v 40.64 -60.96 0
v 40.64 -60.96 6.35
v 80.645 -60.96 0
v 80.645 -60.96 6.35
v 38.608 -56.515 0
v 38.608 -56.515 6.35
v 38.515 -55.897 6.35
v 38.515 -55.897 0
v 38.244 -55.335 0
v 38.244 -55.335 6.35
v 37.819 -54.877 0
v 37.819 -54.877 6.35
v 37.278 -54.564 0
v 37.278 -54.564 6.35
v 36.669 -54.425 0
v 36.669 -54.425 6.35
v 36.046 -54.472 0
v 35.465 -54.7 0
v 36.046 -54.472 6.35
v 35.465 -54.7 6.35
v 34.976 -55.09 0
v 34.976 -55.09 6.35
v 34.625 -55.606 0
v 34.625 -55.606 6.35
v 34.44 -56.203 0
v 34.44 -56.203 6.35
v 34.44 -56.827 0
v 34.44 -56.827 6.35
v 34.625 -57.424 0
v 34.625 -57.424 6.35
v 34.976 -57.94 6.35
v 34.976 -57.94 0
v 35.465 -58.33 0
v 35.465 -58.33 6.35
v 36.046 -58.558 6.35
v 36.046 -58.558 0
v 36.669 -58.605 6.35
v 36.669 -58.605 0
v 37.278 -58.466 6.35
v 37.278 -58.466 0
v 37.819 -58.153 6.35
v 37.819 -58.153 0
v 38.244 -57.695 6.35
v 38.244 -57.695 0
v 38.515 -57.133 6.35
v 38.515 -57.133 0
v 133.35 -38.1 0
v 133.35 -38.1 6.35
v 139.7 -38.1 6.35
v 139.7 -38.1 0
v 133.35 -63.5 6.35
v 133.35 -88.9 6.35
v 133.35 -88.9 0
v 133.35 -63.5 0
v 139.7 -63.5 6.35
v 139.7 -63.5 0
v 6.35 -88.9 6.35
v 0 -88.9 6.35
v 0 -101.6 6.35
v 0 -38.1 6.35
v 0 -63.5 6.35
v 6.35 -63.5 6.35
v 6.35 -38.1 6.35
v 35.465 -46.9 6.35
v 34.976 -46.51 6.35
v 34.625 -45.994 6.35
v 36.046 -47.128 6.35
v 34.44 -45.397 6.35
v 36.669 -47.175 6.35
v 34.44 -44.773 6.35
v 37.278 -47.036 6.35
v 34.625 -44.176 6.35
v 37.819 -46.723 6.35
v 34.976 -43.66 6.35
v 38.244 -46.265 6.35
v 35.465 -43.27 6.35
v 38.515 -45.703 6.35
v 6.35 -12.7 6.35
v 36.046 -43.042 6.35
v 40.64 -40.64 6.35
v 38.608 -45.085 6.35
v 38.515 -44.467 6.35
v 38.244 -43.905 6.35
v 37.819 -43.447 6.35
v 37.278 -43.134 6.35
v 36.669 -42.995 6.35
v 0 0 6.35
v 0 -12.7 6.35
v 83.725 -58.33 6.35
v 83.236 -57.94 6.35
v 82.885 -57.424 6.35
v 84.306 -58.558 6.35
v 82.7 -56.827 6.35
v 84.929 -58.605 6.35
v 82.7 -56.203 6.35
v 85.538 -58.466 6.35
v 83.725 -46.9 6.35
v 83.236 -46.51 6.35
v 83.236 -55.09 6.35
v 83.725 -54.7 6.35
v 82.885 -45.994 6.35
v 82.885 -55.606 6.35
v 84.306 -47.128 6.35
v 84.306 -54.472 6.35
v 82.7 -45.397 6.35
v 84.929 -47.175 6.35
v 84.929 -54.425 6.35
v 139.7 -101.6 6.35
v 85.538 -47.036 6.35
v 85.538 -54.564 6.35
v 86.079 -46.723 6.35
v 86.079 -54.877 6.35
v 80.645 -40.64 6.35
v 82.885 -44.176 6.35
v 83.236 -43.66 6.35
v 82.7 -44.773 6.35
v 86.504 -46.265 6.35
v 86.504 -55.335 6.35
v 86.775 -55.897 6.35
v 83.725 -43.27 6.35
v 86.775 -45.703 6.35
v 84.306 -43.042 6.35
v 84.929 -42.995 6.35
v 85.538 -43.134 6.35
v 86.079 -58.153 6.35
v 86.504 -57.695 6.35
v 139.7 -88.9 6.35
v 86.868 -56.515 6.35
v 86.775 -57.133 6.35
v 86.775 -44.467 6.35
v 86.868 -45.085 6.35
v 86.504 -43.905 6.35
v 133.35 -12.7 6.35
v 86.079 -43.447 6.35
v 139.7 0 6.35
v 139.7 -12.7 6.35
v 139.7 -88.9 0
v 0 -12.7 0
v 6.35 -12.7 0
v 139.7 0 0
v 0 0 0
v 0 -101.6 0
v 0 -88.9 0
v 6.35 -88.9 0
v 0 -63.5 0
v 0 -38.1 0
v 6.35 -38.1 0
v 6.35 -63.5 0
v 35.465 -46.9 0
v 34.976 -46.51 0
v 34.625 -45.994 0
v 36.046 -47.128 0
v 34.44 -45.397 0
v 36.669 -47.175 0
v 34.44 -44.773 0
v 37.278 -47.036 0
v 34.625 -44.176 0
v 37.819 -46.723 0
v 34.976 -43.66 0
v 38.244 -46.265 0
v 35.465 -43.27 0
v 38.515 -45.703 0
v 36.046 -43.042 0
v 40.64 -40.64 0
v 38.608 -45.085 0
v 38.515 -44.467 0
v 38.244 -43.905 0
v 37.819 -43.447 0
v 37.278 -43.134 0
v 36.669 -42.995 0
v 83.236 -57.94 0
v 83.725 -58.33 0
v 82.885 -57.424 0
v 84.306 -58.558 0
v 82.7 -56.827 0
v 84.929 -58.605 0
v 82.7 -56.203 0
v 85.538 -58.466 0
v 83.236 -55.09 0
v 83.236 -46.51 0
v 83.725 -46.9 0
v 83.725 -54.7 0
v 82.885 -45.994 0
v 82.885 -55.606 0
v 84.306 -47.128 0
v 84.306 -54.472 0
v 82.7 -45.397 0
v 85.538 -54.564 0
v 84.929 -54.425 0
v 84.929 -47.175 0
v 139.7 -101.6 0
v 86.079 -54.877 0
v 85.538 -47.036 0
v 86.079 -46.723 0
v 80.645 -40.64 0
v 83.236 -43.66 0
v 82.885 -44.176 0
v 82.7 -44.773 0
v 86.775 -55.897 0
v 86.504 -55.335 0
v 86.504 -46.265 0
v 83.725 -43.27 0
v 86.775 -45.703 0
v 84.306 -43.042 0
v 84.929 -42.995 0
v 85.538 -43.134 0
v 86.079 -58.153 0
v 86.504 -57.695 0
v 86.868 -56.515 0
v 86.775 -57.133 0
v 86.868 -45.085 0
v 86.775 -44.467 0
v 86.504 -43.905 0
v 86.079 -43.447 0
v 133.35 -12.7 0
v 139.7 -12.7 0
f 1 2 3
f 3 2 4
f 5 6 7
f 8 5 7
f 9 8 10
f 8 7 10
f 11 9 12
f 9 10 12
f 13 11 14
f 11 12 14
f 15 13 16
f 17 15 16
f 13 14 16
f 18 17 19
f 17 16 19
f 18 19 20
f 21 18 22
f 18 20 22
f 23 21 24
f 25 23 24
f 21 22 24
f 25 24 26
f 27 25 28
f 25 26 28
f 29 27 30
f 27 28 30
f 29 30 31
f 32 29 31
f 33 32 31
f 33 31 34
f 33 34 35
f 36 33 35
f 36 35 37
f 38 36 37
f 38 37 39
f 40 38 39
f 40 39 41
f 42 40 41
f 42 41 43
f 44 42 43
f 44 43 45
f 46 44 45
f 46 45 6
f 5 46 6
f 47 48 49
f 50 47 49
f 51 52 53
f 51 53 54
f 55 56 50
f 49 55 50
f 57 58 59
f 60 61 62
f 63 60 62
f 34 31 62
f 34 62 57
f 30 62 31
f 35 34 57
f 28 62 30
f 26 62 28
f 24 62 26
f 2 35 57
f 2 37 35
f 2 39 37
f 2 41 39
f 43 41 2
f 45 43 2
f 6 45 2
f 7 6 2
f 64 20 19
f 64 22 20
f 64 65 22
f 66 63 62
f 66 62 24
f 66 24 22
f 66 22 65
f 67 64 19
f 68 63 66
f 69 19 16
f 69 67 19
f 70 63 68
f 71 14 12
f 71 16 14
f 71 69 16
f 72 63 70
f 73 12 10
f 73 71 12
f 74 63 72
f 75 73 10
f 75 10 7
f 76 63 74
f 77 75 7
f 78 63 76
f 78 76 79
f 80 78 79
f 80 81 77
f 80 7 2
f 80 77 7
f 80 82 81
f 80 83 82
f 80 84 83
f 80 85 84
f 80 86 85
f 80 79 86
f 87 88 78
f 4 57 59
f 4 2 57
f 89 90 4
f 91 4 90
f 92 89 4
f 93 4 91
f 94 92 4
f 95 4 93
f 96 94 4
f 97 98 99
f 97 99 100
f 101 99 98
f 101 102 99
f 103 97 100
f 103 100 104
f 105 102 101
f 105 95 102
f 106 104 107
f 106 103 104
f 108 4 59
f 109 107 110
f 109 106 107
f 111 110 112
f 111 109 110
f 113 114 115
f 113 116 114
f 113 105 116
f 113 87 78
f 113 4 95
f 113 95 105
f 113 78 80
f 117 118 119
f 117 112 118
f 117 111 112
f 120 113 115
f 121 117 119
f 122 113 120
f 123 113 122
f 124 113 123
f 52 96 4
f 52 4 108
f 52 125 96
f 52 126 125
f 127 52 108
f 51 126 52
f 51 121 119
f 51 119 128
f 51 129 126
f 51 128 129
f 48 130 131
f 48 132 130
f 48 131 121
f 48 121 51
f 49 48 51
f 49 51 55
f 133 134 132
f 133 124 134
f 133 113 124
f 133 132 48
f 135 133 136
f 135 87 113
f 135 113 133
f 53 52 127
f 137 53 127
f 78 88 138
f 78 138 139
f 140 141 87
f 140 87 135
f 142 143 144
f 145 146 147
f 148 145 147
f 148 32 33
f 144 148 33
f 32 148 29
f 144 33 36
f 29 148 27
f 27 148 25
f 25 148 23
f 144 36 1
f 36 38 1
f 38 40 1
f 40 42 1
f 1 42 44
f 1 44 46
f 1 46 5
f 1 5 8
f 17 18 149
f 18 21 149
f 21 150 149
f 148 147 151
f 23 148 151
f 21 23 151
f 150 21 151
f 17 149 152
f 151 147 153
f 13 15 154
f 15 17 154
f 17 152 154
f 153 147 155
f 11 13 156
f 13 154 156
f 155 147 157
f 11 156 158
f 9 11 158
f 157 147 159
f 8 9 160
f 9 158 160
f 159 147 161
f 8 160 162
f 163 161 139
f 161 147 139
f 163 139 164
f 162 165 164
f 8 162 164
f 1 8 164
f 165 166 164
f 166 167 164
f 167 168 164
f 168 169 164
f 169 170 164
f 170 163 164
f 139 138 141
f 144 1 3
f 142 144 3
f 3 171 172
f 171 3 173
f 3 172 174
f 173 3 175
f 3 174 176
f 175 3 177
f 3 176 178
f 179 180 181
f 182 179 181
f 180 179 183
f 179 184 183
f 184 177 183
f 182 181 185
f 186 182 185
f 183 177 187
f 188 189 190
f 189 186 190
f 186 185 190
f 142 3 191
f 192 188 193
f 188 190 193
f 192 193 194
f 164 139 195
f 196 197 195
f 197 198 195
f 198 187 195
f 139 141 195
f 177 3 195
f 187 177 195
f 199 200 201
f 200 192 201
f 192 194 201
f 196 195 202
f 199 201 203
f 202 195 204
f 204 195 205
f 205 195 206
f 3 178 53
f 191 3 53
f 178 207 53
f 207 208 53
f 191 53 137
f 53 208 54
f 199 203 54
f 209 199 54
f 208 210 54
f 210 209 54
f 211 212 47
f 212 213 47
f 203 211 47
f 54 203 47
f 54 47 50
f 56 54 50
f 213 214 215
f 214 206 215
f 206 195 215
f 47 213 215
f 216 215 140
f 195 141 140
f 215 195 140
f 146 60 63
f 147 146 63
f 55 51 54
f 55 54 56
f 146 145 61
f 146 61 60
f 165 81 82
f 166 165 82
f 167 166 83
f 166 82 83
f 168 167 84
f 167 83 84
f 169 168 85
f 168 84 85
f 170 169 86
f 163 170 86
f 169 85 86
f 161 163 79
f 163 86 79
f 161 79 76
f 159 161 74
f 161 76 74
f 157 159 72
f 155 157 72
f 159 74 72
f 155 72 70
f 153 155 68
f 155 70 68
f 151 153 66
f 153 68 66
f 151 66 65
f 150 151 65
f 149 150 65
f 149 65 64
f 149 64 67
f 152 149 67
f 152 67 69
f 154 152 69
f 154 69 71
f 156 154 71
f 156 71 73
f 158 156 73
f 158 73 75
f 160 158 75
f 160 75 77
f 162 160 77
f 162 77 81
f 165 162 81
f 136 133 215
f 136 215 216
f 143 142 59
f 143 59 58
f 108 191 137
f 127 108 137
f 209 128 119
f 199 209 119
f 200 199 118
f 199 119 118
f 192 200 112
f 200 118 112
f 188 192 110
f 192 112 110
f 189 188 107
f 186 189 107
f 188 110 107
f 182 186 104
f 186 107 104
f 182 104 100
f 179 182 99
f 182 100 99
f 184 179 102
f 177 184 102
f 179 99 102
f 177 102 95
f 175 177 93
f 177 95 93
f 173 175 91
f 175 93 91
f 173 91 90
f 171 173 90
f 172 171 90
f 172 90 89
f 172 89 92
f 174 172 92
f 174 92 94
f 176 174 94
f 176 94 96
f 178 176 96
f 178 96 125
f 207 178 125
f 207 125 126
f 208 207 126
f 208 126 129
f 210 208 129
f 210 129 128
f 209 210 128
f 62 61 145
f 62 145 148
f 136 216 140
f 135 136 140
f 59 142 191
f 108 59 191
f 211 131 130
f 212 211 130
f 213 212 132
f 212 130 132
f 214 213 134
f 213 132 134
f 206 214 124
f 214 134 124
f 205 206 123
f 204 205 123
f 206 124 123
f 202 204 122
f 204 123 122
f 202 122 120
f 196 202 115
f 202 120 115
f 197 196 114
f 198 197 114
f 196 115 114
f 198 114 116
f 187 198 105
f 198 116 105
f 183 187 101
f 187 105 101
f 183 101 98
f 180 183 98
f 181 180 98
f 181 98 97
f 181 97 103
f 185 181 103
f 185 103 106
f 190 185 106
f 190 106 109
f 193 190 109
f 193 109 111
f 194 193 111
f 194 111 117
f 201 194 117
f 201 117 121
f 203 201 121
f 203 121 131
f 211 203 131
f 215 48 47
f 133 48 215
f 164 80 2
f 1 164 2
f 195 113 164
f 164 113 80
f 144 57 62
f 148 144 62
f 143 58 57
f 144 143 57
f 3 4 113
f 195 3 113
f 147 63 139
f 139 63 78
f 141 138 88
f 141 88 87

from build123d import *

# Parameters (mm, degrees)
F0_W     = 139.7
F0_H     = 101.6
F1_DEPTH = 6.35
F2_W     = 29.21
F2_H     = 10.16
F2_W_2   = 10.795
F3_DEPTH = 25.4
F5_R     = 2.0955
F6_DEPTH = 25.4
F7_W     = 6.35
F7_H     = 25.4
F8_DEPTH = 25.4


with BuildPart() as f1:
    # F0 (on Top) → F1 (new body)
    with BuildSketch(Plane.XY):
        with Locations((69.85, -50.8)):
            Rectangle(F0_W, F0_H)
    extrude(amount=F1_DEPTH)

    # F2 (on face) → F3 (cut)
    with BuildSketch(Plane.XY.offset(6.35)):
        with Locations((55.245, -45.72)):
            Rectangle(F2_W, F2_H)
        with Locations((75.2475, -45.72)):
            Rectangle(F2_W_2, F2_H)
        with Locations((55.245, -55.88)):
            Rectangle(F2_W, F2_H)
        with Locations((75.2475, -55.88)):
            Rectangle(F2_W_2, F2_H)
    extrude(amount=-F3_DEPTH, mode=Mode.SUBTRACT)

    # F5 (on face) → F6 (cut)
    with BuildSketch(Plane.XY.offset(6.35)):
        with Locations((84.7725, -45.085)):
            Circle(F5_R)
        with Locations((84.7725, -56.515)):
            Circle(F5_R)
        with Locations((36.5125, -45.085)):
            Circle(F5_R)
        with Locations((36.5125, -56.515)):
            Circle(F5_R)
    extrude(amount=-F6_DEPTH, mode=Mode.SUBTRACT)

    # F7 (on face) → F8 (cut)
    with BuildSketch(Plane.XY.offset(6.35)):
        with Locations((3.175, -25.4)):
            Rectangle(F7_W, F7_H)
        with Locations((3.175, -76.2)):
            Rectangle(F7_W, F7_H)
        with Locations((136.525, -25.4)):
            Rectangle(F7_W, F7_H)
        with Locations((136.525, -76.2)):
            Rectangle(F7_W, F7_H)
    extrude(amount=-F8_DEPTH, mode=Mode.SUBTRACT)


solid = f1.part
